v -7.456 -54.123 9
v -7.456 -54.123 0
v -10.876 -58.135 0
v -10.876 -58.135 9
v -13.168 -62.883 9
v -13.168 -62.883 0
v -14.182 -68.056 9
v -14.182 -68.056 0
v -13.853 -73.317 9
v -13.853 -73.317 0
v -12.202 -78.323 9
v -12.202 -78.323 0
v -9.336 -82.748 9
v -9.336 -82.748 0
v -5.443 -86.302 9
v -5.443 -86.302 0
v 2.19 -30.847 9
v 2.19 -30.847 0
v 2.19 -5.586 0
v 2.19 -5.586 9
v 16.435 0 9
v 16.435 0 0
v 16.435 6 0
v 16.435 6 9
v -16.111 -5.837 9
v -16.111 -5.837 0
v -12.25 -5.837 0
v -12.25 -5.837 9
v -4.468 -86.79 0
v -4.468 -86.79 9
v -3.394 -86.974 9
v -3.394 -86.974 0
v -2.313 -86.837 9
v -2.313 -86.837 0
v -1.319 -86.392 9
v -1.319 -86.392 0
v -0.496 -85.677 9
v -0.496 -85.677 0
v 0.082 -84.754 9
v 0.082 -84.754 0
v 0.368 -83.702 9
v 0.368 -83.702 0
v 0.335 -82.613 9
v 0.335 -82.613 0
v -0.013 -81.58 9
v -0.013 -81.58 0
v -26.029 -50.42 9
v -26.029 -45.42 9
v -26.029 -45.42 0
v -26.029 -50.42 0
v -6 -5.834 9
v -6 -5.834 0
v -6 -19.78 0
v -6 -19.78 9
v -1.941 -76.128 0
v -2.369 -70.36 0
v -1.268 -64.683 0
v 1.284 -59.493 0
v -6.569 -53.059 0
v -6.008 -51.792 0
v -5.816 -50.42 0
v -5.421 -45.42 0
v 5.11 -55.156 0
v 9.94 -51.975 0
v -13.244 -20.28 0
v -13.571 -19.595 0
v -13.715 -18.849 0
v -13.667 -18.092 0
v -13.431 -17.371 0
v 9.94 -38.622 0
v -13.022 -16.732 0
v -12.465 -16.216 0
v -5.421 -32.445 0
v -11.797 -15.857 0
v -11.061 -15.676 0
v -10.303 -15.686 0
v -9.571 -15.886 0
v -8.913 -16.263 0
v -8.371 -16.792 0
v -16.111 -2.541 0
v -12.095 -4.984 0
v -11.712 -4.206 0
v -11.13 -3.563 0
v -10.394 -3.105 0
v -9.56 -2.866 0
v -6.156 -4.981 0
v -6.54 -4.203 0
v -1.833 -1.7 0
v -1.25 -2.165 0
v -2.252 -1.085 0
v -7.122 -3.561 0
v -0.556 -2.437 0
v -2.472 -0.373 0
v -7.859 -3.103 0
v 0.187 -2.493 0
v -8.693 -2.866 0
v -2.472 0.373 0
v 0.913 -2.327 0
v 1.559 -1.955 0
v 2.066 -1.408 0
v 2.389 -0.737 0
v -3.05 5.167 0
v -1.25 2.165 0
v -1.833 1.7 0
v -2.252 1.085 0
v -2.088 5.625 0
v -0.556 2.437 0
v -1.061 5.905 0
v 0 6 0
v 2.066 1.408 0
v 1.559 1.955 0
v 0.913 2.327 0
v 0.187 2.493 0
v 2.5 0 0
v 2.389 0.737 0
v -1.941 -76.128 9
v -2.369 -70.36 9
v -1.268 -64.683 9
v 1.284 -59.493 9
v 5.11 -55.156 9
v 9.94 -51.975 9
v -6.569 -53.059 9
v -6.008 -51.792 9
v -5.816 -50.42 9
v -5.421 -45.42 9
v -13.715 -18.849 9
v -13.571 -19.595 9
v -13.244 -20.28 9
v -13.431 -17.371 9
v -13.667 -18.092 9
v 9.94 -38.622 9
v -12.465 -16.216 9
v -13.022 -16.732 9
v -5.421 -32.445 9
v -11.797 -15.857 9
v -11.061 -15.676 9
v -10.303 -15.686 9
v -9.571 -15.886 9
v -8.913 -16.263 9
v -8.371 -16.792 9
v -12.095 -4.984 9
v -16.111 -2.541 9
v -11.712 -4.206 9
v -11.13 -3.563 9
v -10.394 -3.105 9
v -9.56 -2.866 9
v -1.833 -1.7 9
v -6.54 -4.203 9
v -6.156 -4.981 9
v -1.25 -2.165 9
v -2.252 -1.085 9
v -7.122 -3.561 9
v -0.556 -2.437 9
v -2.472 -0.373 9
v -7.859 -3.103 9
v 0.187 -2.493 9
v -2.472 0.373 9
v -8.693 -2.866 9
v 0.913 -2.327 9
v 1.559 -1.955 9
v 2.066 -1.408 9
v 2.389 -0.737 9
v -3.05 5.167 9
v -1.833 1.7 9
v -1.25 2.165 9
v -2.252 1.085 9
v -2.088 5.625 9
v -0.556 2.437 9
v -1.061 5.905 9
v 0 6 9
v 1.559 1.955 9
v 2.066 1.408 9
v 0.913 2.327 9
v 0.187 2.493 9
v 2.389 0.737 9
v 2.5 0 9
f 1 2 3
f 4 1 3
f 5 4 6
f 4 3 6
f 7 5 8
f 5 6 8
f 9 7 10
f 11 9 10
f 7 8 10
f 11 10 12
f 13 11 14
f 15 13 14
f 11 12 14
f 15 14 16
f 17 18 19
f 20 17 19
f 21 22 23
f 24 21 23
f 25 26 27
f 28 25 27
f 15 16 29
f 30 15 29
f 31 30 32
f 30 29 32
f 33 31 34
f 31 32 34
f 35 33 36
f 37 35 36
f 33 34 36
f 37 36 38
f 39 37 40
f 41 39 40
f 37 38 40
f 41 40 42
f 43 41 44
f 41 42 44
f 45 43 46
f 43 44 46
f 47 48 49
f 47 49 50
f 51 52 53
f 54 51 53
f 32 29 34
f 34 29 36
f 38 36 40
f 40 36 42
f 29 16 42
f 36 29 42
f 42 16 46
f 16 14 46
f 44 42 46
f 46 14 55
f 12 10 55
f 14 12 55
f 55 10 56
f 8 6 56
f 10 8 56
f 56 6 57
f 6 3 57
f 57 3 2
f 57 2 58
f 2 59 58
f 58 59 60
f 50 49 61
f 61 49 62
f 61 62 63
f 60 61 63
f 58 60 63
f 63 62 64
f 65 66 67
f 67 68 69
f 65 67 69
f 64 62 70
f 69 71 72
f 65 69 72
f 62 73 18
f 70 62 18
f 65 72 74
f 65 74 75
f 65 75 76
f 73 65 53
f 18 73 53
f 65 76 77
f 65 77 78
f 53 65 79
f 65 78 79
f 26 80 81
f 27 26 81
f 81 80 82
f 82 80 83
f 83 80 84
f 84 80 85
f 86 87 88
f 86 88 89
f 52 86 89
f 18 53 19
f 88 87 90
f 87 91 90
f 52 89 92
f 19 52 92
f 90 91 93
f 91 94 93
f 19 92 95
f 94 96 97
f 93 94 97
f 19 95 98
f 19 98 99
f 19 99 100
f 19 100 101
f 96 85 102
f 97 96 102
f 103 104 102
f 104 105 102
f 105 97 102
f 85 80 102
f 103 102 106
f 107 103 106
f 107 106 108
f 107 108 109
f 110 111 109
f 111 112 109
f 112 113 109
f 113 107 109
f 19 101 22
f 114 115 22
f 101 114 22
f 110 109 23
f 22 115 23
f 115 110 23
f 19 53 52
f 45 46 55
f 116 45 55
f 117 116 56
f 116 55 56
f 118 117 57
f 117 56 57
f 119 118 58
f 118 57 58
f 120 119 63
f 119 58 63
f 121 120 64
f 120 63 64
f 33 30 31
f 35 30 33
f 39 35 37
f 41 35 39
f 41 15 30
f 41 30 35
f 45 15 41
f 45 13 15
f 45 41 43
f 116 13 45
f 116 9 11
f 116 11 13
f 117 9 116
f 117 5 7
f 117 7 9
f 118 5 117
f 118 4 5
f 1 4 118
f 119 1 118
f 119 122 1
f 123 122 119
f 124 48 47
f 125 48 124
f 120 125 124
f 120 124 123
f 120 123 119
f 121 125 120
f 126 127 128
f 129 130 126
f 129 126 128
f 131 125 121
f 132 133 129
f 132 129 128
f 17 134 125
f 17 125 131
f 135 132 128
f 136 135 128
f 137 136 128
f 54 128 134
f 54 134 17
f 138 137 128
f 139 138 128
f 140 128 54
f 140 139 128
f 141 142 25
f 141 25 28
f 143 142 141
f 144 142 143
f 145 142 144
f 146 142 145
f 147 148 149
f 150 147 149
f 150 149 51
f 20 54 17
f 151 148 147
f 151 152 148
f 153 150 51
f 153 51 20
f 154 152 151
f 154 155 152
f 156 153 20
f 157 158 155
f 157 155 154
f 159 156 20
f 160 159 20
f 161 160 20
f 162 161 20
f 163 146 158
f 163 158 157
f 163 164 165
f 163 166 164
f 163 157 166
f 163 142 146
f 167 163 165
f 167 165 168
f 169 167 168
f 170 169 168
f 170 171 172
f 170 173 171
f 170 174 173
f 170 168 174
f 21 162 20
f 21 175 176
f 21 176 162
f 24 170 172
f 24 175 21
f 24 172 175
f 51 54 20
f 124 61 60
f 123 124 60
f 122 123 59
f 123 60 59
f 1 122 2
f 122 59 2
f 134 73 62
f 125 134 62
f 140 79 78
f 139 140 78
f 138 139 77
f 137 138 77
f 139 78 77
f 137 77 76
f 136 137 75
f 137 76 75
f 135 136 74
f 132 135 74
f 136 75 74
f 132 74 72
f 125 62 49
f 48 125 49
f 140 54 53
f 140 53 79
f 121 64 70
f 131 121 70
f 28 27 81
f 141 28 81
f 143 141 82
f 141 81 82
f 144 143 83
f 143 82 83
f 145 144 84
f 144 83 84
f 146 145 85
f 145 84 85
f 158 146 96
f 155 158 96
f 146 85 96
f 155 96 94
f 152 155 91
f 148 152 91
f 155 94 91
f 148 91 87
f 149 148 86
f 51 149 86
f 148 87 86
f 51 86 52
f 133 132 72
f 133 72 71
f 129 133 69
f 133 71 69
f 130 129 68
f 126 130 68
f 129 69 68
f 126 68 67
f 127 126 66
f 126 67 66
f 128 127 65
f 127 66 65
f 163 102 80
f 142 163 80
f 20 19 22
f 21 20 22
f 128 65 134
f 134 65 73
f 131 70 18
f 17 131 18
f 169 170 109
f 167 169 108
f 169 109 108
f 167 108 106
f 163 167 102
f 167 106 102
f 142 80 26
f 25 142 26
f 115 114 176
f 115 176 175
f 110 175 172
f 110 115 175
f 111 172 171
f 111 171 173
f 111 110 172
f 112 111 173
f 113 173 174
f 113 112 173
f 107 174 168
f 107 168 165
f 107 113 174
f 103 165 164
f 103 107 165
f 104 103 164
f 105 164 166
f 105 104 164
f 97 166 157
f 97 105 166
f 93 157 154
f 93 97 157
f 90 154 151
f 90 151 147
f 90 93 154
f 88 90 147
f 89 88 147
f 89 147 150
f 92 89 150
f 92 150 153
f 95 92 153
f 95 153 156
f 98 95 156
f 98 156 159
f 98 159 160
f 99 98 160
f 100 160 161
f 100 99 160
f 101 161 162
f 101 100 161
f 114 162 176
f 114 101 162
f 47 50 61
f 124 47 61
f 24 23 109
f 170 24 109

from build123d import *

# Parameters (mm, degrees)
SKETCH_1_R      = 6
SKETCH_1_R_2    = 2.5
EXTRUDE_1_DEPTH = 9


with BuildPart() as part:
    # 스케치1 → 보스-돌출1 (new body)
    # profile 1 of 4: a face of its own
    with BuildSketch(Plane.XY):
        with BuildLine():
            ThreePointArc((-6, 0), (-5.210442588, 2.975111433), (-3.049570653, 5.167215772))
            Line((-3.049570653, 5.167215772), (-16.111090591, -2.541389723))
            Line((-16.111090591, -2.541389723), (-16.111090591, -5.836943755))
            Line((-16.111090591, -5.836943755), (-12.250201934, -5.836943755))
            ThreePointArc((-12.250201934, -5.836943755), (-9.126567796, -2.835740329), (-6, -5.833887432))
            Line((-6, -5.833887432), (-6, 0))
        make_face()
    # profile 2 of 4: a face of its own
    with BuildSketch(Plane.XY):
        with BuildLine():
            Line((16.434621945, 6), (0, 6))
            ThreePointArc((0, 6), (4.242640687, 4.242640687), (6, 0))
            ThreePointArc((6, 0), (4.956964072, -3.380607517), (2.190497604, -5.585850002))
            Line((2.190497604, -5.585850002), (16.434621945, 0))
            Line((16.434621945, 0), (16.434621945, 6))
        make_face()
    # profile 3 of 4: a face of its own
    with BuildSketch(Plane.XY):
        Circle(SKETCH_1_R)
        Circle(SKETCH_1_R_2, mode=Mode.SUBTRACT)
    # profile 4 of 4: a face of its own
    with BuildSketch(Plane.XY):
        with BuildLine():
            Line((2.190497604, -30.847252926), (2.190497604, -5.585850002))
            ThreePointArc((2.190497604, -5.585850002), (-3.380607517, -4.956964072), (-6, 0))
            Line((-6, 0), (-6, -5.833887432))
            Line((-6, -5.833887432), (-6, -19.780443195))
            Line((-6, -19.780443195), (-8.3707384, -16.792476109))
            ThreePointArc((-8.3707384, -16.792476109), (-10.302632743, -15.686424516), (-12.464810398, -16.216097687))
            ThreePointArc((-12.464810398, -16.216097687), (-13.667159153, -18.09204707), (-13.244188655, -20.27972268))
            Line((-13.244188655, -20.27972268), (-5.421227317, -32.445374533))
            Line((-5.421227317, -32.445374533), (-5.421227317, -45.420304836))
            Line((-5.421227317, -45.420304836), (-10.815978179, -45.420304836))
            Line((-10.815978179, -45.420304836), (-26.029458153, -45.420304836))
            Line((-26.029458153, -45.420304836), (-26.029458153, -50.420304836))
            Line((-26.029458153, -50.420304836), (-5.815978179, -50.420304836))
            ThreePointArc((-5.815978179, -50.420304836), (-6.244398475, -52.445313233), (-7.456241783, -54.123299752))
            ThreePointArc((-7.456241783, -54.123299752), (-14.186407072, -70.69683465), (-5.442779998, -86.302159685))
            ThreePointArc((-5.442779998, -86.302159685), (-0.881190338, -86.064944821), (-0.013072775, -81.580444512))
            ThreePointArc((-0.013072775, -81.580444512), (-1.268243927, -64.682757564), (9.939607459, -51.974833024))
            Line((9.939607459, -51.974833024), (9.939607459, -38.622486351))
            Line((9.939607459, -38.622486351), (2.190497604, -30.847252926))
        make_face()
    extrude(amount=EXTRUDE_1_DEPTH)


solid = part.part
